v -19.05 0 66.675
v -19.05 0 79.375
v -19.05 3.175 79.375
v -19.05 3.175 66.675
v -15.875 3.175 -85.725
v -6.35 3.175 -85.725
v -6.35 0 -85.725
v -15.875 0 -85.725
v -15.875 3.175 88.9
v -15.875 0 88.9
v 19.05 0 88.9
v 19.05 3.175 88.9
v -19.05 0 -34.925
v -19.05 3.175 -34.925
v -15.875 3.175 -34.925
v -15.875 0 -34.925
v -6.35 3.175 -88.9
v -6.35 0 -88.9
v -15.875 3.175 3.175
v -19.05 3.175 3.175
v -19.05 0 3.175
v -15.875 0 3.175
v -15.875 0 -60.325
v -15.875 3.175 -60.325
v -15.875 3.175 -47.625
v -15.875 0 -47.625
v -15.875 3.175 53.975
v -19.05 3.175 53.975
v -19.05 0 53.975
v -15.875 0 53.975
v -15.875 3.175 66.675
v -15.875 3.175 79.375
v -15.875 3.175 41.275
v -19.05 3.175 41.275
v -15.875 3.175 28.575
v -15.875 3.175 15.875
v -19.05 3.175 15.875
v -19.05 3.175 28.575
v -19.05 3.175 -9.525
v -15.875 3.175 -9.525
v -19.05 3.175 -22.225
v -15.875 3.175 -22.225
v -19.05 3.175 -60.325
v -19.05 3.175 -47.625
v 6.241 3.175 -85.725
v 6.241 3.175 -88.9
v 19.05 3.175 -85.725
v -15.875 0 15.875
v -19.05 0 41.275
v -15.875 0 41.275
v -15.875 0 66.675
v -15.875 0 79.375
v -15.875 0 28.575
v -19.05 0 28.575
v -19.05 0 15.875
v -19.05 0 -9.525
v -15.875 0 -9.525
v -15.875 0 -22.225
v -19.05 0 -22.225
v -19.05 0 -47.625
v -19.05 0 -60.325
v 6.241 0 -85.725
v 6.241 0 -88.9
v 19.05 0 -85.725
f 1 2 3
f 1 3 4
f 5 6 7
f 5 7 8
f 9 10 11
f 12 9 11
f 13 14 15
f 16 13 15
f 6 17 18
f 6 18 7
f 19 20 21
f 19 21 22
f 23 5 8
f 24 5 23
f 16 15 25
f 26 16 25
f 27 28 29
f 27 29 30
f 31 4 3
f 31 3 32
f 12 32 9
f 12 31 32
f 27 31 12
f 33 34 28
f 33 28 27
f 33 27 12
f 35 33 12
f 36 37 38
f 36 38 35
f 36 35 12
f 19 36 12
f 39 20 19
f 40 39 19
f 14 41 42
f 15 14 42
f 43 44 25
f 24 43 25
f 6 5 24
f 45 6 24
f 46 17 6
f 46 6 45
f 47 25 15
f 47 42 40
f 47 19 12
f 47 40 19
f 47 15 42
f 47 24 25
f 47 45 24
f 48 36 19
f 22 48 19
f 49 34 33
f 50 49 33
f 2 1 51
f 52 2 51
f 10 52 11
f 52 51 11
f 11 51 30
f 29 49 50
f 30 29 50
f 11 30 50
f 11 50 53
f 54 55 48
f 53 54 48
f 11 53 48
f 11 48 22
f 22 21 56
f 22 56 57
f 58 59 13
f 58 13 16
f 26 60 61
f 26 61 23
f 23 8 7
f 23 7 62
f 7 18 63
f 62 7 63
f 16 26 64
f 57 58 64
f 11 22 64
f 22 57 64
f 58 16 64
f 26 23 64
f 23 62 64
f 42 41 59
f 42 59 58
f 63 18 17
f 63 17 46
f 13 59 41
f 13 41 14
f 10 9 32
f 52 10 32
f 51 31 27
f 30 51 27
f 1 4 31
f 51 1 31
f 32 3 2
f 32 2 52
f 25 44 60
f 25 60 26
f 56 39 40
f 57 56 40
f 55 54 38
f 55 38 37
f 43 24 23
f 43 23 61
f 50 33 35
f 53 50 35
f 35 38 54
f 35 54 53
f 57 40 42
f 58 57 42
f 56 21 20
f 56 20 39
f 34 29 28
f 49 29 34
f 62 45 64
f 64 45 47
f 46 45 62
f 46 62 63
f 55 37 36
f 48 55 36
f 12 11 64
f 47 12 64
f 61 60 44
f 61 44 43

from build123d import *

# Parameters (mm, degrees)
SKETCH1_W           = 38.1
SKETCH1_H           = 177.8
BOSS_EXTRUDE1_DEPTH = 3.175
SKETCH2_W           = 3.175
SKETCH2_H           = 12.7
SKETCH2_H_2         = 9.525
SKETCH2_W_2         = 12.809265573
SKETCH2_H_3         = 3.175
CUT_EXTRUDE1_DEPTH  = 3.175


with BuildPart() as part:
    # Sketch1 → Boss-Extrude1 (new body)
    with BuildSketch(Plane(origin=(0, 0, 0), x_dir=(1, 0, 0), z_dir=(0, 1, 0))):
        Rectangle(SKETCH1_W, SKETCH1_H)
    extrude(amount=BOSS_EXTRUDE1_DEPTH)

    # Sketch2 → Cut-Extrude1 (cut)
    with BuildSketch(Plane(origin=(0, 3.175, 0), x_dir=(1, 0, 0), z_dir=(0, 1, 0))):
        Polygon((-6.35, 88.9), (-6.35, 85.725), (-15.875, 85.725), (-15.875, 60.325), (-19.05, 60.325), (-19.05, 88.9), (-15.875, 88.9), align=None)
        with Locations((-17.4625, 15.875)):
            Rectangle(SKETCH2_W, SKETCH2_H)
        with Locations((-17.4625, 41.275)):
            Rectangle(SKETCH2_W, SKETCH2_H)
        with Locations((-17.4625, -9.525)):
            Rectangle(SKETCH2_W, SKETCH2_H)
        with Locations((-17.4625, -34.925)):
            Rectangle(SKETCH2_W, SKETCH2_H)
        with Locations((-17.4625, -60.325)):
            Rectangle(SKETCH2_W, SKETCH2_H)
        with Locations((-17.4625, -84.1375)):
            Rectangle(SKETCH2_W, SKETCH2_H_2)
        with Locations((12.645367214, 87.3125)):
            Rectangle(SKETCH2_W_2, SKETCH2_H_3)
    extrude(amount=-CUT_EXTRUDE1_DEPTH, mode=Mode.SUBTRACT)


solid = part.part
